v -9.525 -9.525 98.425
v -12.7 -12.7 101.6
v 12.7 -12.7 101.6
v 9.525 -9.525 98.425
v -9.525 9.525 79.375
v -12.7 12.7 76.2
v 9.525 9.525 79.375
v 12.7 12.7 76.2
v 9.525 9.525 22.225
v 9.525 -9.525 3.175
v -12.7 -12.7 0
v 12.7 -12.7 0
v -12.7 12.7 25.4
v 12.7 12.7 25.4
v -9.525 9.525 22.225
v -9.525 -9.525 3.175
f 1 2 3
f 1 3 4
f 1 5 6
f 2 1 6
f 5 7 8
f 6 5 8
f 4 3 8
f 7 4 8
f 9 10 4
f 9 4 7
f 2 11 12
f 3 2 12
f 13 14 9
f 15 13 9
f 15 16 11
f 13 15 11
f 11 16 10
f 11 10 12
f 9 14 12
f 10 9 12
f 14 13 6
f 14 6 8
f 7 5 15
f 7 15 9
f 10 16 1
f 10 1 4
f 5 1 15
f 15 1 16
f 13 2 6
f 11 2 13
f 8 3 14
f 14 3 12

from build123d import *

# Parameters (mm, degrees)
SKETCH1_W           = 25.4
SKETCH1_H           = 25.4
SKETCH1_W_2         = 19.05
SKETCH1_H_2         = 19.05
BOSS_EXTRUDE1_DEPTH = 101.6
CUT_EXTRUDE1_REACH  = 107.494


with BuildPart() as part:
    # Sketch1 → Boss-Extrude1 (new body)
    with BuildSketch(Plane.XY):
        Rectangle(SKETCH1_W, SKETCH1_H)
        Rectangle(SKETCH1_W_2, SKETCH1_H_2, mode=Mode.SUBTRACT)
    extrude(amount=BOSS_EXTRUDE1_DEPTH)

    # Cut-Extrude1: up to this face of the body (flat: up to its plane)
    cut_extrude1_end = Plane(part.part.faces().sort_by_distance((-12.7, 0, 50.8))[0])
    # Sketch2 → Cut-Extrude1 (cut, up to the picked face)
    with BuildSketch(Plane(origin=(12.7, 0, 0), x_dir=(0, 0, -1), z_dir=(1, 0, 0)), mode=Mode.PRIVATE) as cut_extrude1_sk1:
        Polygon((-101.6, 12.7), (-101.6, -12.7), (-76.2, 12.7), align=None)
    cut_extrude1_tool1 = split(extrude(cut_extrude1_sk1.sketch, amount=-CUT_EXTRUDE1_REACH, mode=Mode.PRIVATE), bisect_by=cut_extrude1_end, keep=Keep.BOTH, mode=Mode.PRIVATE)
    # Sketch2 → Cut-Extrude1 (cut, up to the picked face)
    with BuildSketch(Plane(origin=(12.7, 0, 0), x_dir=(0, 0, -1), z_dir=(1, 0, 0)), mode=Mode.PRIVATE) as cut_extrude1_sk2:
        Polygon((-25.4, 12.7), (0, -12.7), (0, 12.7), align=None)
    cut_extrude1_tool2 = split(extrude(cut_extrude1_sk2.sketch, amount=-CUT_EXTRUDE1_REACH, mode=Mode.PRIVATE), bisect_by=cut_extrude1_end, keep=Keep.BOTH, mode=Mode.PRIVATE)
    add(cut_extrude1_tool1.solids().sort_by(Axis((12.7, 4.233333, 93.133333), (-1, 0, 0)))[0], mode=Mode.SUBTRACT)
    add(cut_extrude1_tool2.solids().sort_by(Axis((12.7, 4.233333, 8.466667), (-1, 0, 0)))[0], mode=Mode.SUBTRACT)


solid = part.part
